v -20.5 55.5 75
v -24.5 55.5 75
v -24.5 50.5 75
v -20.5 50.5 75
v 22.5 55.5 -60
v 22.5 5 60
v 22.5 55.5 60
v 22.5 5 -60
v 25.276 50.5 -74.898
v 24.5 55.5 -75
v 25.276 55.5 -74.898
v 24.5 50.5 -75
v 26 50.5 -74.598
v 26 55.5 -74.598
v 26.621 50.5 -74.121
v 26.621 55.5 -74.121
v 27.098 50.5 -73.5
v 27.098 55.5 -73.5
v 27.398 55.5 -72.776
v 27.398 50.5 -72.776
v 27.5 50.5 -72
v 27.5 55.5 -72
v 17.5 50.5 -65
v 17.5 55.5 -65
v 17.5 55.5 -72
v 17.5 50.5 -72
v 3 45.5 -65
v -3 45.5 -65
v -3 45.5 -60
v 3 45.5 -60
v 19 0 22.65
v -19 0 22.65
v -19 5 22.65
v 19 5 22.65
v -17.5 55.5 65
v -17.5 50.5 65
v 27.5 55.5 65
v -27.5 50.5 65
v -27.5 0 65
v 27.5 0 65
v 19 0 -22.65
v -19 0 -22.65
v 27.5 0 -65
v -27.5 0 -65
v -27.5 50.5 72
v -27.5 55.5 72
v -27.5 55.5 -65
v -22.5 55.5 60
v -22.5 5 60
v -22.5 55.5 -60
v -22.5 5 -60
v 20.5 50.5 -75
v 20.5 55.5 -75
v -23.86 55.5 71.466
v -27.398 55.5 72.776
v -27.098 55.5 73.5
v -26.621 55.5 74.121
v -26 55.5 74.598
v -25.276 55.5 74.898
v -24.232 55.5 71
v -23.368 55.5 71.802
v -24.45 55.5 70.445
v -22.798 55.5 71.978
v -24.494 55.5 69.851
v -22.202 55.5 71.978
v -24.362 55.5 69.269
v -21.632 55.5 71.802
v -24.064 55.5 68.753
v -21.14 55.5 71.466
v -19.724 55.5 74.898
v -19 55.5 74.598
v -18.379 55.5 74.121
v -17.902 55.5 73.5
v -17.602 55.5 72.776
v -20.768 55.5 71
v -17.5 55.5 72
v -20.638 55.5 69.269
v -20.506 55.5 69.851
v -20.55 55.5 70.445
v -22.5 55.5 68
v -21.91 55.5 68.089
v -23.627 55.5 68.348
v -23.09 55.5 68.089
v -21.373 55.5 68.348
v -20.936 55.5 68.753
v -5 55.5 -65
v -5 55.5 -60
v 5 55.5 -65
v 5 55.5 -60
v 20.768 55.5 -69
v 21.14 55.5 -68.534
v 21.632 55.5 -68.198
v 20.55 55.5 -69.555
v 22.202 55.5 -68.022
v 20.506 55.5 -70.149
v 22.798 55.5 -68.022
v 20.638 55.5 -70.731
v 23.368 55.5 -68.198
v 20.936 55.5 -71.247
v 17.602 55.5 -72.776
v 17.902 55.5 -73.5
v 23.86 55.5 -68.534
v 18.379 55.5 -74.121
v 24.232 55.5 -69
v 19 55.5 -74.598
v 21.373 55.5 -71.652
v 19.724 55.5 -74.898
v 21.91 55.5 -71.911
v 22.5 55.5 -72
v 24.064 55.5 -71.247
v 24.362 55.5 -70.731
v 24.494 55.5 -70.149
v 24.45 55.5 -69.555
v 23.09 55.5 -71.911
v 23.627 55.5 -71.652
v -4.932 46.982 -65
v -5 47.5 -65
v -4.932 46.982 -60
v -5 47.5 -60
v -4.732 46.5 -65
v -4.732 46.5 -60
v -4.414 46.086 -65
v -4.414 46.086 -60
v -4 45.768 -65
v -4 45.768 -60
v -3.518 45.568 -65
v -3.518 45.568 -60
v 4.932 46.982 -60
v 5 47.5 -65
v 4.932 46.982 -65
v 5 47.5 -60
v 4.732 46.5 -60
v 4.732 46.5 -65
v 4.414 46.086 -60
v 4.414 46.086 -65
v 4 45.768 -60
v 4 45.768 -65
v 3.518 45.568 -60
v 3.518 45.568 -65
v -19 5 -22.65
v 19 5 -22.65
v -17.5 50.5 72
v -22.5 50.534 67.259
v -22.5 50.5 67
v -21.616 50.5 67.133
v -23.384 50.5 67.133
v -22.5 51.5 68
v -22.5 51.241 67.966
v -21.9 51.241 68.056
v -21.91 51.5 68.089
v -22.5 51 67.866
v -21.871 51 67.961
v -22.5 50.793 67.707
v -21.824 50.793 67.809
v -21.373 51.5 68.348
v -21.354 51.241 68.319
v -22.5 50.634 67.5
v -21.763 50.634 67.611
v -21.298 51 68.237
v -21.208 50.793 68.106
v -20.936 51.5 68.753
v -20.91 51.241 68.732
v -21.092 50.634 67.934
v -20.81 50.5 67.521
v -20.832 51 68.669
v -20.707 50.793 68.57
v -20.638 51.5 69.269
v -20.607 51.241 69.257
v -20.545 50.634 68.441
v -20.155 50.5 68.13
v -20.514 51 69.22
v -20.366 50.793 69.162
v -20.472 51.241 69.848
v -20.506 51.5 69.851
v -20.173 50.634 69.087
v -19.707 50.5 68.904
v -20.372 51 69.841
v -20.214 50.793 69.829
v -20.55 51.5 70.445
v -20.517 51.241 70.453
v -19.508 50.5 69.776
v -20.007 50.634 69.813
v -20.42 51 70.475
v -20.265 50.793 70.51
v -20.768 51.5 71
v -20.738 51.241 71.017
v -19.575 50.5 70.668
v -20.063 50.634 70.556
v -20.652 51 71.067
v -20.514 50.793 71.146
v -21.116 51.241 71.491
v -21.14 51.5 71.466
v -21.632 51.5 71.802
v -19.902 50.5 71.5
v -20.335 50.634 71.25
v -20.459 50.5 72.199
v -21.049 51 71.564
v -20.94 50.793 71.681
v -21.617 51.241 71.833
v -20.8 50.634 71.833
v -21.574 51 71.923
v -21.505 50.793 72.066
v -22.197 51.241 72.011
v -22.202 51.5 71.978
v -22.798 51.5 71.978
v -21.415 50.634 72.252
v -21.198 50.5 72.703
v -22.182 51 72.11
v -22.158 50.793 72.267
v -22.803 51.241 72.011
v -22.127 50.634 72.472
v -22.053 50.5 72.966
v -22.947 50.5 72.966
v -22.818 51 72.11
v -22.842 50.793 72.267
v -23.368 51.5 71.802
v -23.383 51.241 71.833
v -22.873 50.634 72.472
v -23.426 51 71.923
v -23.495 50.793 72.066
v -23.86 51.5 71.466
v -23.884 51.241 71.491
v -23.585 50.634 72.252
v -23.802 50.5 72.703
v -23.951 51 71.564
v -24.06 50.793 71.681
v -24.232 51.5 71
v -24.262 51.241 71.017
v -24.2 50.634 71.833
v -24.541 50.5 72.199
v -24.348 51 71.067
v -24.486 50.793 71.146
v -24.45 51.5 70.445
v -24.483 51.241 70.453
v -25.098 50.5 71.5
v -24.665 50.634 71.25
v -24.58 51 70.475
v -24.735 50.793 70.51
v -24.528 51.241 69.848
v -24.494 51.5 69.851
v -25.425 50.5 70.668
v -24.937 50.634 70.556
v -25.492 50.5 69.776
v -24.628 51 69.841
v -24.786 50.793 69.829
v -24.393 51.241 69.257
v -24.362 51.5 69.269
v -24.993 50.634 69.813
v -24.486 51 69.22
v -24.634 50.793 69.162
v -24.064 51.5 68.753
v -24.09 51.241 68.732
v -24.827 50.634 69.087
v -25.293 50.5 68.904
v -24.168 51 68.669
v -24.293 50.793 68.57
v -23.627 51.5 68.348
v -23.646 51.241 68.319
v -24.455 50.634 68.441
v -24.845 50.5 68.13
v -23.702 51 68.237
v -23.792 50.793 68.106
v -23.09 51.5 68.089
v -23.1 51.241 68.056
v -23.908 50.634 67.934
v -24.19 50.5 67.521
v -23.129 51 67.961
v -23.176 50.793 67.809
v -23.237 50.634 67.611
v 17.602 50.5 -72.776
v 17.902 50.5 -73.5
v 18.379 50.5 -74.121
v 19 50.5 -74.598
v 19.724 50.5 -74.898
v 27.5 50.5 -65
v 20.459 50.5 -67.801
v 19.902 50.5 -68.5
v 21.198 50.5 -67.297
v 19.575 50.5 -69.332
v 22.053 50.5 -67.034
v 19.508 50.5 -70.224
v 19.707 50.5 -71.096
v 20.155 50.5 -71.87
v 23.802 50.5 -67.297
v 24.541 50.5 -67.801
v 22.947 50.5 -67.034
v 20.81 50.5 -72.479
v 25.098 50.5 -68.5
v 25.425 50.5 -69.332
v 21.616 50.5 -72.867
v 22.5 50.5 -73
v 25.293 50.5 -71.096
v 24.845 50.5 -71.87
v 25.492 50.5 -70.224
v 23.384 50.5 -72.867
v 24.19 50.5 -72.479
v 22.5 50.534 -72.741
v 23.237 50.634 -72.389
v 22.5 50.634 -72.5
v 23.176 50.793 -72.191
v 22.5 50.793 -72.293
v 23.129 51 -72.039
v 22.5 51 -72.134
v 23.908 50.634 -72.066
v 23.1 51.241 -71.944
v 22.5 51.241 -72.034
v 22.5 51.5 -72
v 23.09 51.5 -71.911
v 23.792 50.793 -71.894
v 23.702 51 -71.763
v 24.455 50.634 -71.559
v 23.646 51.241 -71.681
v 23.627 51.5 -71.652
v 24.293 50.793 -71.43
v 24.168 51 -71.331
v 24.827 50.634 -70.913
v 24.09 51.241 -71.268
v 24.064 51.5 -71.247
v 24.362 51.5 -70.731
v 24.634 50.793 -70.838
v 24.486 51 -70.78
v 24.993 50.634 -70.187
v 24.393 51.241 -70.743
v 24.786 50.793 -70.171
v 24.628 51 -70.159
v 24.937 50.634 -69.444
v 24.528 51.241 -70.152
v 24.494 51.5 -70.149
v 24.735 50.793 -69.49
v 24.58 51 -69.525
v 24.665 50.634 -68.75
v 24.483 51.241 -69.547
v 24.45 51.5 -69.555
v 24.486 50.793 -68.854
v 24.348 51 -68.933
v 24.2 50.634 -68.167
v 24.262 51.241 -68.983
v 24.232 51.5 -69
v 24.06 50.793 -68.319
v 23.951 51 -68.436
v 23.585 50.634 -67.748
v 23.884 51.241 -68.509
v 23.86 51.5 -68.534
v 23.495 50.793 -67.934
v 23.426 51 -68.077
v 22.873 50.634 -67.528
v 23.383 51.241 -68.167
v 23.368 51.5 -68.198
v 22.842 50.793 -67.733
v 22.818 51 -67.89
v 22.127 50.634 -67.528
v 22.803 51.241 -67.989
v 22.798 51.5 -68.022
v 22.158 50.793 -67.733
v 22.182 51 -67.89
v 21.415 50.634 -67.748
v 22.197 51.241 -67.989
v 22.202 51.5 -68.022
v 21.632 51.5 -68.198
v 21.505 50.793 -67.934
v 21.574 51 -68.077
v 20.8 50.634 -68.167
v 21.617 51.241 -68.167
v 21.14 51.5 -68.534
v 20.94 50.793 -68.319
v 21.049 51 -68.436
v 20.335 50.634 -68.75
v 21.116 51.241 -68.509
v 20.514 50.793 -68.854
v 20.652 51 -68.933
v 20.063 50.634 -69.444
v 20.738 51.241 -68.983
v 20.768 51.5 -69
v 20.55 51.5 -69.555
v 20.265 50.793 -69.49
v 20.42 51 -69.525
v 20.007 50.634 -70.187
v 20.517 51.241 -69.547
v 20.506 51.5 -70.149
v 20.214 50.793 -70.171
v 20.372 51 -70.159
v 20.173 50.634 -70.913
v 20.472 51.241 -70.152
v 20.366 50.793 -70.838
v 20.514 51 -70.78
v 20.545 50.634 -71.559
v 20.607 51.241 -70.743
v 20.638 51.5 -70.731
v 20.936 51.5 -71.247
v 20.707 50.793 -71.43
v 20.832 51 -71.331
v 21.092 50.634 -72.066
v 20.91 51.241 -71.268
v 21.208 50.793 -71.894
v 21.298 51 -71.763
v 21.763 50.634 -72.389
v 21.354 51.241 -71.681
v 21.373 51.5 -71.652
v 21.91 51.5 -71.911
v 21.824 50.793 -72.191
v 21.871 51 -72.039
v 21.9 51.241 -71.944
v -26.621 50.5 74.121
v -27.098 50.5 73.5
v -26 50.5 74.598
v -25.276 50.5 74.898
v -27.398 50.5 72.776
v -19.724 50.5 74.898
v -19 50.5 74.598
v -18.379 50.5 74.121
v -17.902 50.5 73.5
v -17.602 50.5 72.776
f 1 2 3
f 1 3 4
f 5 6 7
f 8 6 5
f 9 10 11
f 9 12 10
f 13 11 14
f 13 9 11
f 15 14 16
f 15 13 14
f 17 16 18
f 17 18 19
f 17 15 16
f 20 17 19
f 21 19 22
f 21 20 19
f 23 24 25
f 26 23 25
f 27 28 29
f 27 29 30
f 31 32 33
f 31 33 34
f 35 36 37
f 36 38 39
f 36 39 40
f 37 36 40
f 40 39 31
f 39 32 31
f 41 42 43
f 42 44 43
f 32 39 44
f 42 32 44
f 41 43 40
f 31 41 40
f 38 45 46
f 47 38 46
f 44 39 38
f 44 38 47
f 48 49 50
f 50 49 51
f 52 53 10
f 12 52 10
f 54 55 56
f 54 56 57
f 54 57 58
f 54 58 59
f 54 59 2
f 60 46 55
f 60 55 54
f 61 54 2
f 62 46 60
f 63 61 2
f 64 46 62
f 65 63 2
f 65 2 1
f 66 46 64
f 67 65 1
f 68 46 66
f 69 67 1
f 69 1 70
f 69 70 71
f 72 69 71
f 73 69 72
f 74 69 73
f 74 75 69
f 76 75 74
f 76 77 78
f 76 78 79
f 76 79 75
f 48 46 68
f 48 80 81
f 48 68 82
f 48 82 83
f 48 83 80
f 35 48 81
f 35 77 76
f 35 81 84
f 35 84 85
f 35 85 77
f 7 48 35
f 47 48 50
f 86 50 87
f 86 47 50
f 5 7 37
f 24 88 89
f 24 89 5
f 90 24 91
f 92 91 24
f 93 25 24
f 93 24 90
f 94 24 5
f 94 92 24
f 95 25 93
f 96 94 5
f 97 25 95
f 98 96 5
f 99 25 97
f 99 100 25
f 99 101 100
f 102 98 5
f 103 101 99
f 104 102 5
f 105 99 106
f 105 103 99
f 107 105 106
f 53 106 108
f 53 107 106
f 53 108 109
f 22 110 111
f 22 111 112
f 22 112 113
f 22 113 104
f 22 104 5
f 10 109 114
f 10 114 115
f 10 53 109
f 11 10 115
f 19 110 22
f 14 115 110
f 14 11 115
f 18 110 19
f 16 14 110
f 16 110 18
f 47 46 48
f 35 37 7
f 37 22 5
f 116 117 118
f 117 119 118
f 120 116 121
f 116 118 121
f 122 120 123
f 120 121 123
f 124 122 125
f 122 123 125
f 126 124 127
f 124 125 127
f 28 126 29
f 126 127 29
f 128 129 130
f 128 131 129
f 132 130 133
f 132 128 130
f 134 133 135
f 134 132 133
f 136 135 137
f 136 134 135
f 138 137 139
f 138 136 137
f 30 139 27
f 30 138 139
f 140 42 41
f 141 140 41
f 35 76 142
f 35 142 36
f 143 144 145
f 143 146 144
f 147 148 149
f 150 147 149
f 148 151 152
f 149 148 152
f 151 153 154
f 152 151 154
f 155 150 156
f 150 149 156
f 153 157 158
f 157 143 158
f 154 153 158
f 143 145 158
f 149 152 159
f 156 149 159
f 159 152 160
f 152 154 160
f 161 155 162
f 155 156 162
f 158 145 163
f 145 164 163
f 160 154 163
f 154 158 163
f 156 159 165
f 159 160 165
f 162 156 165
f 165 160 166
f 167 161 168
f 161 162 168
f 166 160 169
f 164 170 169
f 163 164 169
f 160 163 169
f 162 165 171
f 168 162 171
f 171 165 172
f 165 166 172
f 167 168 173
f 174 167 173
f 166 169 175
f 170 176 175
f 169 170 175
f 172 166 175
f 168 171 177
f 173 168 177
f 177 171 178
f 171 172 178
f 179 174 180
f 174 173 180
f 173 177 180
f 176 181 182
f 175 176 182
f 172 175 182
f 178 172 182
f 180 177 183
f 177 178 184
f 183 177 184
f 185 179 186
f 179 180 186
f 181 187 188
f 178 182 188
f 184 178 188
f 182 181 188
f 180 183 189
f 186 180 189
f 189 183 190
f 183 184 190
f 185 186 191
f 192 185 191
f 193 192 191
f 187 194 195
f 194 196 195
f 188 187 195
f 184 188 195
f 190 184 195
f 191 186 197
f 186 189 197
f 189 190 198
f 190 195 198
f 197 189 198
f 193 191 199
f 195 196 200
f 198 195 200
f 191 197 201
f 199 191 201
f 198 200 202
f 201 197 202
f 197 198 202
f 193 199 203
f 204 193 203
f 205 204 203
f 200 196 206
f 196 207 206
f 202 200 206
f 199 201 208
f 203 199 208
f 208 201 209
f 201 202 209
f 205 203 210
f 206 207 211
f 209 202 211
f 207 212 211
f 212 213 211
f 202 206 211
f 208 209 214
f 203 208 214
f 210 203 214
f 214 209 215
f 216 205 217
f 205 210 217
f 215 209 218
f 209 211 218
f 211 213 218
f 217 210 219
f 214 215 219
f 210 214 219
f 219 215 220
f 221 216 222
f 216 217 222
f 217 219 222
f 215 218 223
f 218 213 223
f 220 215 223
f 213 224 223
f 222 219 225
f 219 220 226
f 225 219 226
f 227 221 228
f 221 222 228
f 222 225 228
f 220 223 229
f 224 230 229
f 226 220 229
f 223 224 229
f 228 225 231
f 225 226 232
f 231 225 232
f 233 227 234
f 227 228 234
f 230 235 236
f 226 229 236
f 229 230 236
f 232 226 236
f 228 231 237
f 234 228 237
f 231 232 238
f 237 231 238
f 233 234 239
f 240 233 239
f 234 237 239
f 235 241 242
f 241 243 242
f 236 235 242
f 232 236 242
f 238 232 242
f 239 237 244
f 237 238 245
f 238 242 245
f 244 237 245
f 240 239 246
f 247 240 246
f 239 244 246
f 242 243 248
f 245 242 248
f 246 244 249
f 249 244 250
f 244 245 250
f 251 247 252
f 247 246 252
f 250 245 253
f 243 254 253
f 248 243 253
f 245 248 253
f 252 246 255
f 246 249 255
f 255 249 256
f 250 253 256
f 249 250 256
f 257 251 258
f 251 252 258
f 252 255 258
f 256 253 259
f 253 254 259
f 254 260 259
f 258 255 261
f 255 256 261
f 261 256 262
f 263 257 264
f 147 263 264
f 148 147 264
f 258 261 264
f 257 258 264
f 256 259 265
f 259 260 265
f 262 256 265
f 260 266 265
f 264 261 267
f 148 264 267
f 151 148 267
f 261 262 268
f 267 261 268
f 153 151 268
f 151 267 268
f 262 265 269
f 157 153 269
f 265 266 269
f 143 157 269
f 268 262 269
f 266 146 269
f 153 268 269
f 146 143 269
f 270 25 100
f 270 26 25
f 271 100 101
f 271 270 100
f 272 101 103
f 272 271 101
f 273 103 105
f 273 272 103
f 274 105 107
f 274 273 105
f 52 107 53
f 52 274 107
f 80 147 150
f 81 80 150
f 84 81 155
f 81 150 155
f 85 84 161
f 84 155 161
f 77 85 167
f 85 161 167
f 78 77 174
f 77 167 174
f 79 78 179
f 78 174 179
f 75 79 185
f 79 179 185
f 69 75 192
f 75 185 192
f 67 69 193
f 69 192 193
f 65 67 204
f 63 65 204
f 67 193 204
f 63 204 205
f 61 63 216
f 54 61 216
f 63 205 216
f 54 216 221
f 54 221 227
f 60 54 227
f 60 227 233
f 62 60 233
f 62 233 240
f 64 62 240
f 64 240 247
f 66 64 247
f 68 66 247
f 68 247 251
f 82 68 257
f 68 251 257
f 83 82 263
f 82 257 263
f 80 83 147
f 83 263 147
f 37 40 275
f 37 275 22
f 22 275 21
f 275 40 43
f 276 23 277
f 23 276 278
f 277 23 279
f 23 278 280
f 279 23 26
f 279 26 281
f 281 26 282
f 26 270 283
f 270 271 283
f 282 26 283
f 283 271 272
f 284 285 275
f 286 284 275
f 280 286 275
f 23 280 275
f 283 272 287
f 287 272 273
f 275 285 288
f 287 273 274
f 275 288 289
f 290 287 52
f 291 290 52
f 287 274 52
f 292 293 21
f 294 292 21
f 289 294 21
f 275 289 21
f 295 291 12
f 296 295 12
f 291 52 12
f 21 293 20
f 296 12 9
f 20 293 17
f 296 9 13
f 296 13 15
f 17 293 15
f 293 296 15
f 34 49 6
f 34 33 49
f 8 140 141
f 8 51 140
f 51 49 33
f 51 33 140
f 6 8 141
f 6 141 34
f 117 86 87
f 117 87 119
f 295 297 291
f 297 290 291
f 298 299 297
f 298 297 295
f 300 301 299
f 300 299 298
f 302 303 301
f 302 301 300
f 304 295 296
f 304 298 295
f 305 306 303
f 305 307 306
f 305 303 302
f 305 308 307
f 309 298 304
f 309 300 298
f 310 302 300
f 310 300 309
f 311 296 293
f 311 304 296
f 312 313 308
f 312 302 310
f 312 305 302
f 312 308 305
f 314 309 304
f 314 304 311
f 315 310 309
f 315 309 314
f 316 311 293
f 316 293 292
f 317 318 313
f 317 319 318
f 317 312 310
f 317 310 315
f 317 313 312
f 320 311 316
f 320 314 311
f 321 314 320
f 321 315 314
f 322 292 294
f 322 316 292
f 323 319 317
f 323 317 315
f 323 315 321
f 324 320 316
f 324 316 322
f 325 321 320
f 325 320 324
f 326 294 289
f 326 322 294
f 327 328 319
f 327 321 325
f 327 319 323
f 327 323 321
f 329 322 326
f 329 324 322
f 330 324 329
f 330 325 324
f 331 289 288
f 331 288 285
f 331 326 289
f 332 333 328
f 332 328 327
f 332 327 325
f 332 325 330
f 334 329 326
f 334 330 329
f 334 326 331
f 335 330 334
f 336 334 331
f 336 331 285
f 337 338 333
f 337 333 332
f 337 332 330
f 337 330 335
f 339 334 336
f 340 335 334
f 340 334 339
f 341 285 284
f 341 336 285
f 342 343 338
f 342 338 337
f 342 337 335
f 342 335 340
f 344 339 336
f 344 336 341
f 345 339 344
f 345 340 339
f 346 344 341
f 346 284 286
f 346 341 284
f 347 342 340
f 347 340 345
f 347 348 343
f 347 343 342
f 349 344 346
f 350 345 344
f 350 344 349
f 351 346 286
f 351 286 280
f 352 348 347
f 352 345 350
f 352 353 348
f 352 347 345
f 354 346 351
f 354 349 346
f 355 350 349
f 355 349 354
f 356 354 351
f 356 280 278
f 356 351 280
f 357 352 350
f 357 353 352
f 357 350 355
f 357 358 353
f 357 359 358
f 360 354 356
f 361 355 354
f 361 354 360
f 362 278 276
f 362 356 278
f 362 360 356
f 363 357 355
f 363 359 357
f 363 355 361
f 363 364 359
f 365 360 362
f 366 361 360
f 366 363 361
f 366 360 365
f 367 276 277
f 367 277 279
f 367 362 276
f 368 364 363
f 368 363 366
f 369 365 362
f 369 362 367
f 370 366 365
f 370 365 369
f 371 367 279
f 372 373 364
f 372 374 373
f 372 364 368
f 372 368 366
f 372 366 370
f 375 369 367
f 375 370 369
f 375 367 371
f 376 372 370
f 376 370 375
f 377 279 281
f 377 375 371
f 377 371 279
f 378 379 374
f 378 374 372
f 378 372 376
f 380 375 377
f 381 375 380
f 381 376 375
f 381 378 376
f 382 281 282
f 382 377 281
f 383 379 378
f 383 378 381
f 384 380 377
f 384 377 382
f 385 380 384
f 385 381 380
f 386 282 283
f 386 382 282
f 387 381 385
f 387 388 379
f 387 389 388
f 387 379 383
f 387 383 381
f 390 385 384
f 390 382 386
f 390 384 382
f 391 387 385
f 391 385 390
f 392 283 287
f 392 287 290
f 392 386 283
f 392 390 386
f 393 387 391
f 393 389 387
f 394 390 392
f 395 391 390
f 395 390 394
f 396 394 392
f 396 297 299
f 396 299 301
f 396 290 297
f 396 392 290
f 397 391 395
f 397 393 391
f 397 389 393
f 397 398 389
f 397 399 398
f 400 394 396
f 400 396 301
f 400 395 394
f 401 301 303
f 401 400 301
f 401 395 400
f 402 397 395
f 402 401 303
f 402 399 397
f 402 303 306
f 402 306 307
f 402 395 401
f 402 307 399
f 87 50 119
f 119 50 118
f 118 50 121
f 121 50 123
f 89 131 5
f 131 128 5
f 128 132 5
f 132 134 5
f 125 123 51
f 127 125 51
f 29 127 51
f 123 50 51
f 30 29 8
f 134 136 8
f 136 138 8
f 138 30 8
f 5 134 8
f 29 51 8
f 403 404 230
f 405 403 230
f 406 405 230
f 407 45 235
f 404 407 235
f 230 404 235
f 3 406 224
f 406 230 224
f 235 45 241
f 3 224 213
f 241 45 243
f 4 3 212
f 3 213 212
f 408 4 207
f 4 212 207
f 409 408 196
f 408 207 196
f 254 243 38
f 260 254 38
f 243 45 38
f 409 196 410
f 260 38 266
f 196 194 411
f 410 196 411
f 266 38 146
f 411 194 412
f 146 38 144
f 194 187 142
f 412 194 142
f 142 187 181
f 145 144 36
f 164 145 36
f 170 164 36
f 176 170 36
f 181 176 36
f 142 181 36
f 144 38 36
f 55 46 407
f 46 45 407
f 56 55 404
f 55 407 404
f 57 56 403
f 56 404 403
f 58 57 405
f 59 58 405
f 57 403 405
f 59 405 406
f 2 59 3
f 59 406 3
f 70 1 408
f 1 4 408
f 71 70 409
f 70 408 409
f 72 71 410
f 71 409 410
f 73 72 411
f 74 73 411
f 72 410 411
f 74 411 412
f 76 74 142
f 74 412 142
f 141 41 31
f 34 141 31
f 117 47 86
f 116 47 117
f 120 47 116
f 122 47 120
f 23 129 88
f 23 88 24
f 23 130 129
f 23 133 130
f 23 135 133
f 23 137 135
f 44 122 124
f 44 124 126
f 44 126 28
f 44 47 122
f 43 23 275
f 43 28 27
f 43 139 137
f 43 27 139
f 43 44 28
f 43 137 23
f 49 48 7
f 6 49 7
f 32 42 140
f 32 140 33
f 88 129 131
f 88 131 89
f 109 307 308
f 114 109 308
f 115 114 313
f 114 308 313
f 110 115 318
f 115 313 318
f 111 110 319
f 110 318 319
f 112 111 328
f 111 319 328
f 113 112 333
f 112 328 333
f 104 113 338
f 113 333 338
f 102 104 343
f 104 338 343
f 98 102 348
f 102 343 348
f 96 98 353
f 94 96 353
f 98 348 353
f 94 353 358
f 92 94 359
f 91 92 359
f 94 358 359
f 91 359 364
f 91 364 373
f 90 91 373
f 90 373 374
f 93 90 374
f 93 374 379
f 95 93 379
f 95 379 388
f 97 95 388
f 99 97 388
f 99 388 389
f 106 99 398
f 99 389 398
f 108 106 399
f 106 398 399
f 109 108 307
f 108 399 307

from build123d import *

# Parameters (mm, degrees)
SKETCH1_W           = 27.5
SKETCH1_H           = 65
BOSS_EXTRUDE1_DEPTH = 5
SKETCH2_W           = 55
SKETCH2_H           = 130
SKETCH2_W_2         = 45
SKETCH2_H_2         = 120
BOSS_EXTRUDE2_DEPTH = 50.5
SKETCH3_W           = 10
SKETCH3_H           = 10
BOSS_EXTRUDE4_DEPTH = 5
SKETCH4_R           = 2
CUT_EXTRUDE1_DEPTH  = 5
FILLET1_R           = 1
FILLET2_R           = 1
SKETCH6_W           = 38
SKETCH6_H           = 45.3
CUT_EXTRUDE2_DEPTH  = 5
FILLET3_R           = 3
CUT_EXTRUDE3_DEPTH  = 5
FILLET4_R           = 2


with BuildPart() as part:
    # Sketch1 → Boss-Extrude1 (new body)
    with BuildSketch(Plane(origin=(0, 0, 0), x_dir=(1, 0, 0), z_dir=(0, 1, 0))):
        Polygon((27.5, 0), (0, 0), (0, 65), (-27.5, 65), (-27.5, -65), (27.5, -65), align=None)
        with Locations((13.75, 32.5)):
            Rectangle(SKETCH1_W, SKETCH1_H)
    extrude(amount=BOSS_EXTRUDE1_DEPTH)

    # Sketch2 → Boss-Extrude2 (add)
    with BuildSketch(Plane(origin=(0, 5, 0), x_dir=(1, 0, 0), z_dir=(0, 1, 0))):
        Rectangle(SKETCH2_W, SKETCH2_H)
        Rectangle(SKETCH2_W_2, SKETCH2_H_2, mode=Mode.SUBTRACT)
    extrude(amount=BOSS_EXTRUDE2_DEPTH)

    # Sketch3 → Boss-Extrude4 (add)
    with BuildSketch(Plane(origin=(0, 55.5, 0), x_dir=(1, 0, 0), z_dir=(0, 1, 0))):
        with Locations((22.5, 70)):
            Rectangle(SKETCH3_W, SKETCH3_H)
        with Locations((-22.5, -70)):
            Rectangle(SKETCH3_W, SKETCH3_H)
    extrude(amount=-BOSS_EXTRUDE4_DEPTH)

    # Sketch4 → Cut-Extrude1 (cut)
    with BuildSketch(Plane.XZ.offset(-50.5)):
        with Locations(Location((22.5, -70, 0), (0, 0, 270))):
            Circle(SKETCH4_R)
        with Locations(Location((-22.5, 70, 0), (0, 0, 270))):
            Circle(SKETCH4_R)
    extrude(amount=-CUT_EXTRUDE1_DEPTH, mode=Mode.SUBTRACT)

    # Fillet1
    fillet1_edges = [part.edges().sort_by_distance(p)[0] for p in [
        (22.5, 50.5, -68),
    ]]
    fillet(fillet1_edges, radius=FILLET1_R)

    # Fillet2
    fillet2_edges = [part.edges().sort_by_distance(p)[0] for p in [
        (-22.5, 50.5, 72),
    ]]
    fillet(fillet2_edges, radius=FILLET2_R)

    # Sketch6 → Cut-Extrude2 (cut)
    with BuildSketch(Plane.XZ):
        Rectangle(SKETCH6_W, SKETCH6_H)
    extrude(amount=-CUT_EXTRUDE2_DEPTH, mode=Mode.SUBTRACT)

    # Fillet3
    fillet3_edges = [part.edges().sort_by_distance(p)[0] for p in [
        (17.5, 53, -75),
        (27.5, 53, -75),
        (-17.5, 53, 75),
        (-27.5, 53, 75),
    ]]
    fillet(fillet3_edges, radius=FILLET3_R)

    # Sketch8 → Cut-Extrude3 (cut)
    with BuildSketch(Plane(origin=(0, 0, -65), x_dir=(-1, 0, 0), z_dir=(0, 0, -1))):
        Polygon((0, 55.5), (5, 55.5), (5, 45.5), (-5, 45.5), (-5, 55.5), align=None)
    extrude(amount=-CUT_EXTRUDE3_DEPTH, mode=Mode.SUBTRACT)

    # Fillet4
    fillet4_edges = [part.edges().sort_by_distance(p)[0] for p in [
        (-5, 45.5, -62.5),
        (5, 45.5, -62.5),
    ]]
    fillet(fillet4_edges, radius=FILLET4_R)


solid = part.part
